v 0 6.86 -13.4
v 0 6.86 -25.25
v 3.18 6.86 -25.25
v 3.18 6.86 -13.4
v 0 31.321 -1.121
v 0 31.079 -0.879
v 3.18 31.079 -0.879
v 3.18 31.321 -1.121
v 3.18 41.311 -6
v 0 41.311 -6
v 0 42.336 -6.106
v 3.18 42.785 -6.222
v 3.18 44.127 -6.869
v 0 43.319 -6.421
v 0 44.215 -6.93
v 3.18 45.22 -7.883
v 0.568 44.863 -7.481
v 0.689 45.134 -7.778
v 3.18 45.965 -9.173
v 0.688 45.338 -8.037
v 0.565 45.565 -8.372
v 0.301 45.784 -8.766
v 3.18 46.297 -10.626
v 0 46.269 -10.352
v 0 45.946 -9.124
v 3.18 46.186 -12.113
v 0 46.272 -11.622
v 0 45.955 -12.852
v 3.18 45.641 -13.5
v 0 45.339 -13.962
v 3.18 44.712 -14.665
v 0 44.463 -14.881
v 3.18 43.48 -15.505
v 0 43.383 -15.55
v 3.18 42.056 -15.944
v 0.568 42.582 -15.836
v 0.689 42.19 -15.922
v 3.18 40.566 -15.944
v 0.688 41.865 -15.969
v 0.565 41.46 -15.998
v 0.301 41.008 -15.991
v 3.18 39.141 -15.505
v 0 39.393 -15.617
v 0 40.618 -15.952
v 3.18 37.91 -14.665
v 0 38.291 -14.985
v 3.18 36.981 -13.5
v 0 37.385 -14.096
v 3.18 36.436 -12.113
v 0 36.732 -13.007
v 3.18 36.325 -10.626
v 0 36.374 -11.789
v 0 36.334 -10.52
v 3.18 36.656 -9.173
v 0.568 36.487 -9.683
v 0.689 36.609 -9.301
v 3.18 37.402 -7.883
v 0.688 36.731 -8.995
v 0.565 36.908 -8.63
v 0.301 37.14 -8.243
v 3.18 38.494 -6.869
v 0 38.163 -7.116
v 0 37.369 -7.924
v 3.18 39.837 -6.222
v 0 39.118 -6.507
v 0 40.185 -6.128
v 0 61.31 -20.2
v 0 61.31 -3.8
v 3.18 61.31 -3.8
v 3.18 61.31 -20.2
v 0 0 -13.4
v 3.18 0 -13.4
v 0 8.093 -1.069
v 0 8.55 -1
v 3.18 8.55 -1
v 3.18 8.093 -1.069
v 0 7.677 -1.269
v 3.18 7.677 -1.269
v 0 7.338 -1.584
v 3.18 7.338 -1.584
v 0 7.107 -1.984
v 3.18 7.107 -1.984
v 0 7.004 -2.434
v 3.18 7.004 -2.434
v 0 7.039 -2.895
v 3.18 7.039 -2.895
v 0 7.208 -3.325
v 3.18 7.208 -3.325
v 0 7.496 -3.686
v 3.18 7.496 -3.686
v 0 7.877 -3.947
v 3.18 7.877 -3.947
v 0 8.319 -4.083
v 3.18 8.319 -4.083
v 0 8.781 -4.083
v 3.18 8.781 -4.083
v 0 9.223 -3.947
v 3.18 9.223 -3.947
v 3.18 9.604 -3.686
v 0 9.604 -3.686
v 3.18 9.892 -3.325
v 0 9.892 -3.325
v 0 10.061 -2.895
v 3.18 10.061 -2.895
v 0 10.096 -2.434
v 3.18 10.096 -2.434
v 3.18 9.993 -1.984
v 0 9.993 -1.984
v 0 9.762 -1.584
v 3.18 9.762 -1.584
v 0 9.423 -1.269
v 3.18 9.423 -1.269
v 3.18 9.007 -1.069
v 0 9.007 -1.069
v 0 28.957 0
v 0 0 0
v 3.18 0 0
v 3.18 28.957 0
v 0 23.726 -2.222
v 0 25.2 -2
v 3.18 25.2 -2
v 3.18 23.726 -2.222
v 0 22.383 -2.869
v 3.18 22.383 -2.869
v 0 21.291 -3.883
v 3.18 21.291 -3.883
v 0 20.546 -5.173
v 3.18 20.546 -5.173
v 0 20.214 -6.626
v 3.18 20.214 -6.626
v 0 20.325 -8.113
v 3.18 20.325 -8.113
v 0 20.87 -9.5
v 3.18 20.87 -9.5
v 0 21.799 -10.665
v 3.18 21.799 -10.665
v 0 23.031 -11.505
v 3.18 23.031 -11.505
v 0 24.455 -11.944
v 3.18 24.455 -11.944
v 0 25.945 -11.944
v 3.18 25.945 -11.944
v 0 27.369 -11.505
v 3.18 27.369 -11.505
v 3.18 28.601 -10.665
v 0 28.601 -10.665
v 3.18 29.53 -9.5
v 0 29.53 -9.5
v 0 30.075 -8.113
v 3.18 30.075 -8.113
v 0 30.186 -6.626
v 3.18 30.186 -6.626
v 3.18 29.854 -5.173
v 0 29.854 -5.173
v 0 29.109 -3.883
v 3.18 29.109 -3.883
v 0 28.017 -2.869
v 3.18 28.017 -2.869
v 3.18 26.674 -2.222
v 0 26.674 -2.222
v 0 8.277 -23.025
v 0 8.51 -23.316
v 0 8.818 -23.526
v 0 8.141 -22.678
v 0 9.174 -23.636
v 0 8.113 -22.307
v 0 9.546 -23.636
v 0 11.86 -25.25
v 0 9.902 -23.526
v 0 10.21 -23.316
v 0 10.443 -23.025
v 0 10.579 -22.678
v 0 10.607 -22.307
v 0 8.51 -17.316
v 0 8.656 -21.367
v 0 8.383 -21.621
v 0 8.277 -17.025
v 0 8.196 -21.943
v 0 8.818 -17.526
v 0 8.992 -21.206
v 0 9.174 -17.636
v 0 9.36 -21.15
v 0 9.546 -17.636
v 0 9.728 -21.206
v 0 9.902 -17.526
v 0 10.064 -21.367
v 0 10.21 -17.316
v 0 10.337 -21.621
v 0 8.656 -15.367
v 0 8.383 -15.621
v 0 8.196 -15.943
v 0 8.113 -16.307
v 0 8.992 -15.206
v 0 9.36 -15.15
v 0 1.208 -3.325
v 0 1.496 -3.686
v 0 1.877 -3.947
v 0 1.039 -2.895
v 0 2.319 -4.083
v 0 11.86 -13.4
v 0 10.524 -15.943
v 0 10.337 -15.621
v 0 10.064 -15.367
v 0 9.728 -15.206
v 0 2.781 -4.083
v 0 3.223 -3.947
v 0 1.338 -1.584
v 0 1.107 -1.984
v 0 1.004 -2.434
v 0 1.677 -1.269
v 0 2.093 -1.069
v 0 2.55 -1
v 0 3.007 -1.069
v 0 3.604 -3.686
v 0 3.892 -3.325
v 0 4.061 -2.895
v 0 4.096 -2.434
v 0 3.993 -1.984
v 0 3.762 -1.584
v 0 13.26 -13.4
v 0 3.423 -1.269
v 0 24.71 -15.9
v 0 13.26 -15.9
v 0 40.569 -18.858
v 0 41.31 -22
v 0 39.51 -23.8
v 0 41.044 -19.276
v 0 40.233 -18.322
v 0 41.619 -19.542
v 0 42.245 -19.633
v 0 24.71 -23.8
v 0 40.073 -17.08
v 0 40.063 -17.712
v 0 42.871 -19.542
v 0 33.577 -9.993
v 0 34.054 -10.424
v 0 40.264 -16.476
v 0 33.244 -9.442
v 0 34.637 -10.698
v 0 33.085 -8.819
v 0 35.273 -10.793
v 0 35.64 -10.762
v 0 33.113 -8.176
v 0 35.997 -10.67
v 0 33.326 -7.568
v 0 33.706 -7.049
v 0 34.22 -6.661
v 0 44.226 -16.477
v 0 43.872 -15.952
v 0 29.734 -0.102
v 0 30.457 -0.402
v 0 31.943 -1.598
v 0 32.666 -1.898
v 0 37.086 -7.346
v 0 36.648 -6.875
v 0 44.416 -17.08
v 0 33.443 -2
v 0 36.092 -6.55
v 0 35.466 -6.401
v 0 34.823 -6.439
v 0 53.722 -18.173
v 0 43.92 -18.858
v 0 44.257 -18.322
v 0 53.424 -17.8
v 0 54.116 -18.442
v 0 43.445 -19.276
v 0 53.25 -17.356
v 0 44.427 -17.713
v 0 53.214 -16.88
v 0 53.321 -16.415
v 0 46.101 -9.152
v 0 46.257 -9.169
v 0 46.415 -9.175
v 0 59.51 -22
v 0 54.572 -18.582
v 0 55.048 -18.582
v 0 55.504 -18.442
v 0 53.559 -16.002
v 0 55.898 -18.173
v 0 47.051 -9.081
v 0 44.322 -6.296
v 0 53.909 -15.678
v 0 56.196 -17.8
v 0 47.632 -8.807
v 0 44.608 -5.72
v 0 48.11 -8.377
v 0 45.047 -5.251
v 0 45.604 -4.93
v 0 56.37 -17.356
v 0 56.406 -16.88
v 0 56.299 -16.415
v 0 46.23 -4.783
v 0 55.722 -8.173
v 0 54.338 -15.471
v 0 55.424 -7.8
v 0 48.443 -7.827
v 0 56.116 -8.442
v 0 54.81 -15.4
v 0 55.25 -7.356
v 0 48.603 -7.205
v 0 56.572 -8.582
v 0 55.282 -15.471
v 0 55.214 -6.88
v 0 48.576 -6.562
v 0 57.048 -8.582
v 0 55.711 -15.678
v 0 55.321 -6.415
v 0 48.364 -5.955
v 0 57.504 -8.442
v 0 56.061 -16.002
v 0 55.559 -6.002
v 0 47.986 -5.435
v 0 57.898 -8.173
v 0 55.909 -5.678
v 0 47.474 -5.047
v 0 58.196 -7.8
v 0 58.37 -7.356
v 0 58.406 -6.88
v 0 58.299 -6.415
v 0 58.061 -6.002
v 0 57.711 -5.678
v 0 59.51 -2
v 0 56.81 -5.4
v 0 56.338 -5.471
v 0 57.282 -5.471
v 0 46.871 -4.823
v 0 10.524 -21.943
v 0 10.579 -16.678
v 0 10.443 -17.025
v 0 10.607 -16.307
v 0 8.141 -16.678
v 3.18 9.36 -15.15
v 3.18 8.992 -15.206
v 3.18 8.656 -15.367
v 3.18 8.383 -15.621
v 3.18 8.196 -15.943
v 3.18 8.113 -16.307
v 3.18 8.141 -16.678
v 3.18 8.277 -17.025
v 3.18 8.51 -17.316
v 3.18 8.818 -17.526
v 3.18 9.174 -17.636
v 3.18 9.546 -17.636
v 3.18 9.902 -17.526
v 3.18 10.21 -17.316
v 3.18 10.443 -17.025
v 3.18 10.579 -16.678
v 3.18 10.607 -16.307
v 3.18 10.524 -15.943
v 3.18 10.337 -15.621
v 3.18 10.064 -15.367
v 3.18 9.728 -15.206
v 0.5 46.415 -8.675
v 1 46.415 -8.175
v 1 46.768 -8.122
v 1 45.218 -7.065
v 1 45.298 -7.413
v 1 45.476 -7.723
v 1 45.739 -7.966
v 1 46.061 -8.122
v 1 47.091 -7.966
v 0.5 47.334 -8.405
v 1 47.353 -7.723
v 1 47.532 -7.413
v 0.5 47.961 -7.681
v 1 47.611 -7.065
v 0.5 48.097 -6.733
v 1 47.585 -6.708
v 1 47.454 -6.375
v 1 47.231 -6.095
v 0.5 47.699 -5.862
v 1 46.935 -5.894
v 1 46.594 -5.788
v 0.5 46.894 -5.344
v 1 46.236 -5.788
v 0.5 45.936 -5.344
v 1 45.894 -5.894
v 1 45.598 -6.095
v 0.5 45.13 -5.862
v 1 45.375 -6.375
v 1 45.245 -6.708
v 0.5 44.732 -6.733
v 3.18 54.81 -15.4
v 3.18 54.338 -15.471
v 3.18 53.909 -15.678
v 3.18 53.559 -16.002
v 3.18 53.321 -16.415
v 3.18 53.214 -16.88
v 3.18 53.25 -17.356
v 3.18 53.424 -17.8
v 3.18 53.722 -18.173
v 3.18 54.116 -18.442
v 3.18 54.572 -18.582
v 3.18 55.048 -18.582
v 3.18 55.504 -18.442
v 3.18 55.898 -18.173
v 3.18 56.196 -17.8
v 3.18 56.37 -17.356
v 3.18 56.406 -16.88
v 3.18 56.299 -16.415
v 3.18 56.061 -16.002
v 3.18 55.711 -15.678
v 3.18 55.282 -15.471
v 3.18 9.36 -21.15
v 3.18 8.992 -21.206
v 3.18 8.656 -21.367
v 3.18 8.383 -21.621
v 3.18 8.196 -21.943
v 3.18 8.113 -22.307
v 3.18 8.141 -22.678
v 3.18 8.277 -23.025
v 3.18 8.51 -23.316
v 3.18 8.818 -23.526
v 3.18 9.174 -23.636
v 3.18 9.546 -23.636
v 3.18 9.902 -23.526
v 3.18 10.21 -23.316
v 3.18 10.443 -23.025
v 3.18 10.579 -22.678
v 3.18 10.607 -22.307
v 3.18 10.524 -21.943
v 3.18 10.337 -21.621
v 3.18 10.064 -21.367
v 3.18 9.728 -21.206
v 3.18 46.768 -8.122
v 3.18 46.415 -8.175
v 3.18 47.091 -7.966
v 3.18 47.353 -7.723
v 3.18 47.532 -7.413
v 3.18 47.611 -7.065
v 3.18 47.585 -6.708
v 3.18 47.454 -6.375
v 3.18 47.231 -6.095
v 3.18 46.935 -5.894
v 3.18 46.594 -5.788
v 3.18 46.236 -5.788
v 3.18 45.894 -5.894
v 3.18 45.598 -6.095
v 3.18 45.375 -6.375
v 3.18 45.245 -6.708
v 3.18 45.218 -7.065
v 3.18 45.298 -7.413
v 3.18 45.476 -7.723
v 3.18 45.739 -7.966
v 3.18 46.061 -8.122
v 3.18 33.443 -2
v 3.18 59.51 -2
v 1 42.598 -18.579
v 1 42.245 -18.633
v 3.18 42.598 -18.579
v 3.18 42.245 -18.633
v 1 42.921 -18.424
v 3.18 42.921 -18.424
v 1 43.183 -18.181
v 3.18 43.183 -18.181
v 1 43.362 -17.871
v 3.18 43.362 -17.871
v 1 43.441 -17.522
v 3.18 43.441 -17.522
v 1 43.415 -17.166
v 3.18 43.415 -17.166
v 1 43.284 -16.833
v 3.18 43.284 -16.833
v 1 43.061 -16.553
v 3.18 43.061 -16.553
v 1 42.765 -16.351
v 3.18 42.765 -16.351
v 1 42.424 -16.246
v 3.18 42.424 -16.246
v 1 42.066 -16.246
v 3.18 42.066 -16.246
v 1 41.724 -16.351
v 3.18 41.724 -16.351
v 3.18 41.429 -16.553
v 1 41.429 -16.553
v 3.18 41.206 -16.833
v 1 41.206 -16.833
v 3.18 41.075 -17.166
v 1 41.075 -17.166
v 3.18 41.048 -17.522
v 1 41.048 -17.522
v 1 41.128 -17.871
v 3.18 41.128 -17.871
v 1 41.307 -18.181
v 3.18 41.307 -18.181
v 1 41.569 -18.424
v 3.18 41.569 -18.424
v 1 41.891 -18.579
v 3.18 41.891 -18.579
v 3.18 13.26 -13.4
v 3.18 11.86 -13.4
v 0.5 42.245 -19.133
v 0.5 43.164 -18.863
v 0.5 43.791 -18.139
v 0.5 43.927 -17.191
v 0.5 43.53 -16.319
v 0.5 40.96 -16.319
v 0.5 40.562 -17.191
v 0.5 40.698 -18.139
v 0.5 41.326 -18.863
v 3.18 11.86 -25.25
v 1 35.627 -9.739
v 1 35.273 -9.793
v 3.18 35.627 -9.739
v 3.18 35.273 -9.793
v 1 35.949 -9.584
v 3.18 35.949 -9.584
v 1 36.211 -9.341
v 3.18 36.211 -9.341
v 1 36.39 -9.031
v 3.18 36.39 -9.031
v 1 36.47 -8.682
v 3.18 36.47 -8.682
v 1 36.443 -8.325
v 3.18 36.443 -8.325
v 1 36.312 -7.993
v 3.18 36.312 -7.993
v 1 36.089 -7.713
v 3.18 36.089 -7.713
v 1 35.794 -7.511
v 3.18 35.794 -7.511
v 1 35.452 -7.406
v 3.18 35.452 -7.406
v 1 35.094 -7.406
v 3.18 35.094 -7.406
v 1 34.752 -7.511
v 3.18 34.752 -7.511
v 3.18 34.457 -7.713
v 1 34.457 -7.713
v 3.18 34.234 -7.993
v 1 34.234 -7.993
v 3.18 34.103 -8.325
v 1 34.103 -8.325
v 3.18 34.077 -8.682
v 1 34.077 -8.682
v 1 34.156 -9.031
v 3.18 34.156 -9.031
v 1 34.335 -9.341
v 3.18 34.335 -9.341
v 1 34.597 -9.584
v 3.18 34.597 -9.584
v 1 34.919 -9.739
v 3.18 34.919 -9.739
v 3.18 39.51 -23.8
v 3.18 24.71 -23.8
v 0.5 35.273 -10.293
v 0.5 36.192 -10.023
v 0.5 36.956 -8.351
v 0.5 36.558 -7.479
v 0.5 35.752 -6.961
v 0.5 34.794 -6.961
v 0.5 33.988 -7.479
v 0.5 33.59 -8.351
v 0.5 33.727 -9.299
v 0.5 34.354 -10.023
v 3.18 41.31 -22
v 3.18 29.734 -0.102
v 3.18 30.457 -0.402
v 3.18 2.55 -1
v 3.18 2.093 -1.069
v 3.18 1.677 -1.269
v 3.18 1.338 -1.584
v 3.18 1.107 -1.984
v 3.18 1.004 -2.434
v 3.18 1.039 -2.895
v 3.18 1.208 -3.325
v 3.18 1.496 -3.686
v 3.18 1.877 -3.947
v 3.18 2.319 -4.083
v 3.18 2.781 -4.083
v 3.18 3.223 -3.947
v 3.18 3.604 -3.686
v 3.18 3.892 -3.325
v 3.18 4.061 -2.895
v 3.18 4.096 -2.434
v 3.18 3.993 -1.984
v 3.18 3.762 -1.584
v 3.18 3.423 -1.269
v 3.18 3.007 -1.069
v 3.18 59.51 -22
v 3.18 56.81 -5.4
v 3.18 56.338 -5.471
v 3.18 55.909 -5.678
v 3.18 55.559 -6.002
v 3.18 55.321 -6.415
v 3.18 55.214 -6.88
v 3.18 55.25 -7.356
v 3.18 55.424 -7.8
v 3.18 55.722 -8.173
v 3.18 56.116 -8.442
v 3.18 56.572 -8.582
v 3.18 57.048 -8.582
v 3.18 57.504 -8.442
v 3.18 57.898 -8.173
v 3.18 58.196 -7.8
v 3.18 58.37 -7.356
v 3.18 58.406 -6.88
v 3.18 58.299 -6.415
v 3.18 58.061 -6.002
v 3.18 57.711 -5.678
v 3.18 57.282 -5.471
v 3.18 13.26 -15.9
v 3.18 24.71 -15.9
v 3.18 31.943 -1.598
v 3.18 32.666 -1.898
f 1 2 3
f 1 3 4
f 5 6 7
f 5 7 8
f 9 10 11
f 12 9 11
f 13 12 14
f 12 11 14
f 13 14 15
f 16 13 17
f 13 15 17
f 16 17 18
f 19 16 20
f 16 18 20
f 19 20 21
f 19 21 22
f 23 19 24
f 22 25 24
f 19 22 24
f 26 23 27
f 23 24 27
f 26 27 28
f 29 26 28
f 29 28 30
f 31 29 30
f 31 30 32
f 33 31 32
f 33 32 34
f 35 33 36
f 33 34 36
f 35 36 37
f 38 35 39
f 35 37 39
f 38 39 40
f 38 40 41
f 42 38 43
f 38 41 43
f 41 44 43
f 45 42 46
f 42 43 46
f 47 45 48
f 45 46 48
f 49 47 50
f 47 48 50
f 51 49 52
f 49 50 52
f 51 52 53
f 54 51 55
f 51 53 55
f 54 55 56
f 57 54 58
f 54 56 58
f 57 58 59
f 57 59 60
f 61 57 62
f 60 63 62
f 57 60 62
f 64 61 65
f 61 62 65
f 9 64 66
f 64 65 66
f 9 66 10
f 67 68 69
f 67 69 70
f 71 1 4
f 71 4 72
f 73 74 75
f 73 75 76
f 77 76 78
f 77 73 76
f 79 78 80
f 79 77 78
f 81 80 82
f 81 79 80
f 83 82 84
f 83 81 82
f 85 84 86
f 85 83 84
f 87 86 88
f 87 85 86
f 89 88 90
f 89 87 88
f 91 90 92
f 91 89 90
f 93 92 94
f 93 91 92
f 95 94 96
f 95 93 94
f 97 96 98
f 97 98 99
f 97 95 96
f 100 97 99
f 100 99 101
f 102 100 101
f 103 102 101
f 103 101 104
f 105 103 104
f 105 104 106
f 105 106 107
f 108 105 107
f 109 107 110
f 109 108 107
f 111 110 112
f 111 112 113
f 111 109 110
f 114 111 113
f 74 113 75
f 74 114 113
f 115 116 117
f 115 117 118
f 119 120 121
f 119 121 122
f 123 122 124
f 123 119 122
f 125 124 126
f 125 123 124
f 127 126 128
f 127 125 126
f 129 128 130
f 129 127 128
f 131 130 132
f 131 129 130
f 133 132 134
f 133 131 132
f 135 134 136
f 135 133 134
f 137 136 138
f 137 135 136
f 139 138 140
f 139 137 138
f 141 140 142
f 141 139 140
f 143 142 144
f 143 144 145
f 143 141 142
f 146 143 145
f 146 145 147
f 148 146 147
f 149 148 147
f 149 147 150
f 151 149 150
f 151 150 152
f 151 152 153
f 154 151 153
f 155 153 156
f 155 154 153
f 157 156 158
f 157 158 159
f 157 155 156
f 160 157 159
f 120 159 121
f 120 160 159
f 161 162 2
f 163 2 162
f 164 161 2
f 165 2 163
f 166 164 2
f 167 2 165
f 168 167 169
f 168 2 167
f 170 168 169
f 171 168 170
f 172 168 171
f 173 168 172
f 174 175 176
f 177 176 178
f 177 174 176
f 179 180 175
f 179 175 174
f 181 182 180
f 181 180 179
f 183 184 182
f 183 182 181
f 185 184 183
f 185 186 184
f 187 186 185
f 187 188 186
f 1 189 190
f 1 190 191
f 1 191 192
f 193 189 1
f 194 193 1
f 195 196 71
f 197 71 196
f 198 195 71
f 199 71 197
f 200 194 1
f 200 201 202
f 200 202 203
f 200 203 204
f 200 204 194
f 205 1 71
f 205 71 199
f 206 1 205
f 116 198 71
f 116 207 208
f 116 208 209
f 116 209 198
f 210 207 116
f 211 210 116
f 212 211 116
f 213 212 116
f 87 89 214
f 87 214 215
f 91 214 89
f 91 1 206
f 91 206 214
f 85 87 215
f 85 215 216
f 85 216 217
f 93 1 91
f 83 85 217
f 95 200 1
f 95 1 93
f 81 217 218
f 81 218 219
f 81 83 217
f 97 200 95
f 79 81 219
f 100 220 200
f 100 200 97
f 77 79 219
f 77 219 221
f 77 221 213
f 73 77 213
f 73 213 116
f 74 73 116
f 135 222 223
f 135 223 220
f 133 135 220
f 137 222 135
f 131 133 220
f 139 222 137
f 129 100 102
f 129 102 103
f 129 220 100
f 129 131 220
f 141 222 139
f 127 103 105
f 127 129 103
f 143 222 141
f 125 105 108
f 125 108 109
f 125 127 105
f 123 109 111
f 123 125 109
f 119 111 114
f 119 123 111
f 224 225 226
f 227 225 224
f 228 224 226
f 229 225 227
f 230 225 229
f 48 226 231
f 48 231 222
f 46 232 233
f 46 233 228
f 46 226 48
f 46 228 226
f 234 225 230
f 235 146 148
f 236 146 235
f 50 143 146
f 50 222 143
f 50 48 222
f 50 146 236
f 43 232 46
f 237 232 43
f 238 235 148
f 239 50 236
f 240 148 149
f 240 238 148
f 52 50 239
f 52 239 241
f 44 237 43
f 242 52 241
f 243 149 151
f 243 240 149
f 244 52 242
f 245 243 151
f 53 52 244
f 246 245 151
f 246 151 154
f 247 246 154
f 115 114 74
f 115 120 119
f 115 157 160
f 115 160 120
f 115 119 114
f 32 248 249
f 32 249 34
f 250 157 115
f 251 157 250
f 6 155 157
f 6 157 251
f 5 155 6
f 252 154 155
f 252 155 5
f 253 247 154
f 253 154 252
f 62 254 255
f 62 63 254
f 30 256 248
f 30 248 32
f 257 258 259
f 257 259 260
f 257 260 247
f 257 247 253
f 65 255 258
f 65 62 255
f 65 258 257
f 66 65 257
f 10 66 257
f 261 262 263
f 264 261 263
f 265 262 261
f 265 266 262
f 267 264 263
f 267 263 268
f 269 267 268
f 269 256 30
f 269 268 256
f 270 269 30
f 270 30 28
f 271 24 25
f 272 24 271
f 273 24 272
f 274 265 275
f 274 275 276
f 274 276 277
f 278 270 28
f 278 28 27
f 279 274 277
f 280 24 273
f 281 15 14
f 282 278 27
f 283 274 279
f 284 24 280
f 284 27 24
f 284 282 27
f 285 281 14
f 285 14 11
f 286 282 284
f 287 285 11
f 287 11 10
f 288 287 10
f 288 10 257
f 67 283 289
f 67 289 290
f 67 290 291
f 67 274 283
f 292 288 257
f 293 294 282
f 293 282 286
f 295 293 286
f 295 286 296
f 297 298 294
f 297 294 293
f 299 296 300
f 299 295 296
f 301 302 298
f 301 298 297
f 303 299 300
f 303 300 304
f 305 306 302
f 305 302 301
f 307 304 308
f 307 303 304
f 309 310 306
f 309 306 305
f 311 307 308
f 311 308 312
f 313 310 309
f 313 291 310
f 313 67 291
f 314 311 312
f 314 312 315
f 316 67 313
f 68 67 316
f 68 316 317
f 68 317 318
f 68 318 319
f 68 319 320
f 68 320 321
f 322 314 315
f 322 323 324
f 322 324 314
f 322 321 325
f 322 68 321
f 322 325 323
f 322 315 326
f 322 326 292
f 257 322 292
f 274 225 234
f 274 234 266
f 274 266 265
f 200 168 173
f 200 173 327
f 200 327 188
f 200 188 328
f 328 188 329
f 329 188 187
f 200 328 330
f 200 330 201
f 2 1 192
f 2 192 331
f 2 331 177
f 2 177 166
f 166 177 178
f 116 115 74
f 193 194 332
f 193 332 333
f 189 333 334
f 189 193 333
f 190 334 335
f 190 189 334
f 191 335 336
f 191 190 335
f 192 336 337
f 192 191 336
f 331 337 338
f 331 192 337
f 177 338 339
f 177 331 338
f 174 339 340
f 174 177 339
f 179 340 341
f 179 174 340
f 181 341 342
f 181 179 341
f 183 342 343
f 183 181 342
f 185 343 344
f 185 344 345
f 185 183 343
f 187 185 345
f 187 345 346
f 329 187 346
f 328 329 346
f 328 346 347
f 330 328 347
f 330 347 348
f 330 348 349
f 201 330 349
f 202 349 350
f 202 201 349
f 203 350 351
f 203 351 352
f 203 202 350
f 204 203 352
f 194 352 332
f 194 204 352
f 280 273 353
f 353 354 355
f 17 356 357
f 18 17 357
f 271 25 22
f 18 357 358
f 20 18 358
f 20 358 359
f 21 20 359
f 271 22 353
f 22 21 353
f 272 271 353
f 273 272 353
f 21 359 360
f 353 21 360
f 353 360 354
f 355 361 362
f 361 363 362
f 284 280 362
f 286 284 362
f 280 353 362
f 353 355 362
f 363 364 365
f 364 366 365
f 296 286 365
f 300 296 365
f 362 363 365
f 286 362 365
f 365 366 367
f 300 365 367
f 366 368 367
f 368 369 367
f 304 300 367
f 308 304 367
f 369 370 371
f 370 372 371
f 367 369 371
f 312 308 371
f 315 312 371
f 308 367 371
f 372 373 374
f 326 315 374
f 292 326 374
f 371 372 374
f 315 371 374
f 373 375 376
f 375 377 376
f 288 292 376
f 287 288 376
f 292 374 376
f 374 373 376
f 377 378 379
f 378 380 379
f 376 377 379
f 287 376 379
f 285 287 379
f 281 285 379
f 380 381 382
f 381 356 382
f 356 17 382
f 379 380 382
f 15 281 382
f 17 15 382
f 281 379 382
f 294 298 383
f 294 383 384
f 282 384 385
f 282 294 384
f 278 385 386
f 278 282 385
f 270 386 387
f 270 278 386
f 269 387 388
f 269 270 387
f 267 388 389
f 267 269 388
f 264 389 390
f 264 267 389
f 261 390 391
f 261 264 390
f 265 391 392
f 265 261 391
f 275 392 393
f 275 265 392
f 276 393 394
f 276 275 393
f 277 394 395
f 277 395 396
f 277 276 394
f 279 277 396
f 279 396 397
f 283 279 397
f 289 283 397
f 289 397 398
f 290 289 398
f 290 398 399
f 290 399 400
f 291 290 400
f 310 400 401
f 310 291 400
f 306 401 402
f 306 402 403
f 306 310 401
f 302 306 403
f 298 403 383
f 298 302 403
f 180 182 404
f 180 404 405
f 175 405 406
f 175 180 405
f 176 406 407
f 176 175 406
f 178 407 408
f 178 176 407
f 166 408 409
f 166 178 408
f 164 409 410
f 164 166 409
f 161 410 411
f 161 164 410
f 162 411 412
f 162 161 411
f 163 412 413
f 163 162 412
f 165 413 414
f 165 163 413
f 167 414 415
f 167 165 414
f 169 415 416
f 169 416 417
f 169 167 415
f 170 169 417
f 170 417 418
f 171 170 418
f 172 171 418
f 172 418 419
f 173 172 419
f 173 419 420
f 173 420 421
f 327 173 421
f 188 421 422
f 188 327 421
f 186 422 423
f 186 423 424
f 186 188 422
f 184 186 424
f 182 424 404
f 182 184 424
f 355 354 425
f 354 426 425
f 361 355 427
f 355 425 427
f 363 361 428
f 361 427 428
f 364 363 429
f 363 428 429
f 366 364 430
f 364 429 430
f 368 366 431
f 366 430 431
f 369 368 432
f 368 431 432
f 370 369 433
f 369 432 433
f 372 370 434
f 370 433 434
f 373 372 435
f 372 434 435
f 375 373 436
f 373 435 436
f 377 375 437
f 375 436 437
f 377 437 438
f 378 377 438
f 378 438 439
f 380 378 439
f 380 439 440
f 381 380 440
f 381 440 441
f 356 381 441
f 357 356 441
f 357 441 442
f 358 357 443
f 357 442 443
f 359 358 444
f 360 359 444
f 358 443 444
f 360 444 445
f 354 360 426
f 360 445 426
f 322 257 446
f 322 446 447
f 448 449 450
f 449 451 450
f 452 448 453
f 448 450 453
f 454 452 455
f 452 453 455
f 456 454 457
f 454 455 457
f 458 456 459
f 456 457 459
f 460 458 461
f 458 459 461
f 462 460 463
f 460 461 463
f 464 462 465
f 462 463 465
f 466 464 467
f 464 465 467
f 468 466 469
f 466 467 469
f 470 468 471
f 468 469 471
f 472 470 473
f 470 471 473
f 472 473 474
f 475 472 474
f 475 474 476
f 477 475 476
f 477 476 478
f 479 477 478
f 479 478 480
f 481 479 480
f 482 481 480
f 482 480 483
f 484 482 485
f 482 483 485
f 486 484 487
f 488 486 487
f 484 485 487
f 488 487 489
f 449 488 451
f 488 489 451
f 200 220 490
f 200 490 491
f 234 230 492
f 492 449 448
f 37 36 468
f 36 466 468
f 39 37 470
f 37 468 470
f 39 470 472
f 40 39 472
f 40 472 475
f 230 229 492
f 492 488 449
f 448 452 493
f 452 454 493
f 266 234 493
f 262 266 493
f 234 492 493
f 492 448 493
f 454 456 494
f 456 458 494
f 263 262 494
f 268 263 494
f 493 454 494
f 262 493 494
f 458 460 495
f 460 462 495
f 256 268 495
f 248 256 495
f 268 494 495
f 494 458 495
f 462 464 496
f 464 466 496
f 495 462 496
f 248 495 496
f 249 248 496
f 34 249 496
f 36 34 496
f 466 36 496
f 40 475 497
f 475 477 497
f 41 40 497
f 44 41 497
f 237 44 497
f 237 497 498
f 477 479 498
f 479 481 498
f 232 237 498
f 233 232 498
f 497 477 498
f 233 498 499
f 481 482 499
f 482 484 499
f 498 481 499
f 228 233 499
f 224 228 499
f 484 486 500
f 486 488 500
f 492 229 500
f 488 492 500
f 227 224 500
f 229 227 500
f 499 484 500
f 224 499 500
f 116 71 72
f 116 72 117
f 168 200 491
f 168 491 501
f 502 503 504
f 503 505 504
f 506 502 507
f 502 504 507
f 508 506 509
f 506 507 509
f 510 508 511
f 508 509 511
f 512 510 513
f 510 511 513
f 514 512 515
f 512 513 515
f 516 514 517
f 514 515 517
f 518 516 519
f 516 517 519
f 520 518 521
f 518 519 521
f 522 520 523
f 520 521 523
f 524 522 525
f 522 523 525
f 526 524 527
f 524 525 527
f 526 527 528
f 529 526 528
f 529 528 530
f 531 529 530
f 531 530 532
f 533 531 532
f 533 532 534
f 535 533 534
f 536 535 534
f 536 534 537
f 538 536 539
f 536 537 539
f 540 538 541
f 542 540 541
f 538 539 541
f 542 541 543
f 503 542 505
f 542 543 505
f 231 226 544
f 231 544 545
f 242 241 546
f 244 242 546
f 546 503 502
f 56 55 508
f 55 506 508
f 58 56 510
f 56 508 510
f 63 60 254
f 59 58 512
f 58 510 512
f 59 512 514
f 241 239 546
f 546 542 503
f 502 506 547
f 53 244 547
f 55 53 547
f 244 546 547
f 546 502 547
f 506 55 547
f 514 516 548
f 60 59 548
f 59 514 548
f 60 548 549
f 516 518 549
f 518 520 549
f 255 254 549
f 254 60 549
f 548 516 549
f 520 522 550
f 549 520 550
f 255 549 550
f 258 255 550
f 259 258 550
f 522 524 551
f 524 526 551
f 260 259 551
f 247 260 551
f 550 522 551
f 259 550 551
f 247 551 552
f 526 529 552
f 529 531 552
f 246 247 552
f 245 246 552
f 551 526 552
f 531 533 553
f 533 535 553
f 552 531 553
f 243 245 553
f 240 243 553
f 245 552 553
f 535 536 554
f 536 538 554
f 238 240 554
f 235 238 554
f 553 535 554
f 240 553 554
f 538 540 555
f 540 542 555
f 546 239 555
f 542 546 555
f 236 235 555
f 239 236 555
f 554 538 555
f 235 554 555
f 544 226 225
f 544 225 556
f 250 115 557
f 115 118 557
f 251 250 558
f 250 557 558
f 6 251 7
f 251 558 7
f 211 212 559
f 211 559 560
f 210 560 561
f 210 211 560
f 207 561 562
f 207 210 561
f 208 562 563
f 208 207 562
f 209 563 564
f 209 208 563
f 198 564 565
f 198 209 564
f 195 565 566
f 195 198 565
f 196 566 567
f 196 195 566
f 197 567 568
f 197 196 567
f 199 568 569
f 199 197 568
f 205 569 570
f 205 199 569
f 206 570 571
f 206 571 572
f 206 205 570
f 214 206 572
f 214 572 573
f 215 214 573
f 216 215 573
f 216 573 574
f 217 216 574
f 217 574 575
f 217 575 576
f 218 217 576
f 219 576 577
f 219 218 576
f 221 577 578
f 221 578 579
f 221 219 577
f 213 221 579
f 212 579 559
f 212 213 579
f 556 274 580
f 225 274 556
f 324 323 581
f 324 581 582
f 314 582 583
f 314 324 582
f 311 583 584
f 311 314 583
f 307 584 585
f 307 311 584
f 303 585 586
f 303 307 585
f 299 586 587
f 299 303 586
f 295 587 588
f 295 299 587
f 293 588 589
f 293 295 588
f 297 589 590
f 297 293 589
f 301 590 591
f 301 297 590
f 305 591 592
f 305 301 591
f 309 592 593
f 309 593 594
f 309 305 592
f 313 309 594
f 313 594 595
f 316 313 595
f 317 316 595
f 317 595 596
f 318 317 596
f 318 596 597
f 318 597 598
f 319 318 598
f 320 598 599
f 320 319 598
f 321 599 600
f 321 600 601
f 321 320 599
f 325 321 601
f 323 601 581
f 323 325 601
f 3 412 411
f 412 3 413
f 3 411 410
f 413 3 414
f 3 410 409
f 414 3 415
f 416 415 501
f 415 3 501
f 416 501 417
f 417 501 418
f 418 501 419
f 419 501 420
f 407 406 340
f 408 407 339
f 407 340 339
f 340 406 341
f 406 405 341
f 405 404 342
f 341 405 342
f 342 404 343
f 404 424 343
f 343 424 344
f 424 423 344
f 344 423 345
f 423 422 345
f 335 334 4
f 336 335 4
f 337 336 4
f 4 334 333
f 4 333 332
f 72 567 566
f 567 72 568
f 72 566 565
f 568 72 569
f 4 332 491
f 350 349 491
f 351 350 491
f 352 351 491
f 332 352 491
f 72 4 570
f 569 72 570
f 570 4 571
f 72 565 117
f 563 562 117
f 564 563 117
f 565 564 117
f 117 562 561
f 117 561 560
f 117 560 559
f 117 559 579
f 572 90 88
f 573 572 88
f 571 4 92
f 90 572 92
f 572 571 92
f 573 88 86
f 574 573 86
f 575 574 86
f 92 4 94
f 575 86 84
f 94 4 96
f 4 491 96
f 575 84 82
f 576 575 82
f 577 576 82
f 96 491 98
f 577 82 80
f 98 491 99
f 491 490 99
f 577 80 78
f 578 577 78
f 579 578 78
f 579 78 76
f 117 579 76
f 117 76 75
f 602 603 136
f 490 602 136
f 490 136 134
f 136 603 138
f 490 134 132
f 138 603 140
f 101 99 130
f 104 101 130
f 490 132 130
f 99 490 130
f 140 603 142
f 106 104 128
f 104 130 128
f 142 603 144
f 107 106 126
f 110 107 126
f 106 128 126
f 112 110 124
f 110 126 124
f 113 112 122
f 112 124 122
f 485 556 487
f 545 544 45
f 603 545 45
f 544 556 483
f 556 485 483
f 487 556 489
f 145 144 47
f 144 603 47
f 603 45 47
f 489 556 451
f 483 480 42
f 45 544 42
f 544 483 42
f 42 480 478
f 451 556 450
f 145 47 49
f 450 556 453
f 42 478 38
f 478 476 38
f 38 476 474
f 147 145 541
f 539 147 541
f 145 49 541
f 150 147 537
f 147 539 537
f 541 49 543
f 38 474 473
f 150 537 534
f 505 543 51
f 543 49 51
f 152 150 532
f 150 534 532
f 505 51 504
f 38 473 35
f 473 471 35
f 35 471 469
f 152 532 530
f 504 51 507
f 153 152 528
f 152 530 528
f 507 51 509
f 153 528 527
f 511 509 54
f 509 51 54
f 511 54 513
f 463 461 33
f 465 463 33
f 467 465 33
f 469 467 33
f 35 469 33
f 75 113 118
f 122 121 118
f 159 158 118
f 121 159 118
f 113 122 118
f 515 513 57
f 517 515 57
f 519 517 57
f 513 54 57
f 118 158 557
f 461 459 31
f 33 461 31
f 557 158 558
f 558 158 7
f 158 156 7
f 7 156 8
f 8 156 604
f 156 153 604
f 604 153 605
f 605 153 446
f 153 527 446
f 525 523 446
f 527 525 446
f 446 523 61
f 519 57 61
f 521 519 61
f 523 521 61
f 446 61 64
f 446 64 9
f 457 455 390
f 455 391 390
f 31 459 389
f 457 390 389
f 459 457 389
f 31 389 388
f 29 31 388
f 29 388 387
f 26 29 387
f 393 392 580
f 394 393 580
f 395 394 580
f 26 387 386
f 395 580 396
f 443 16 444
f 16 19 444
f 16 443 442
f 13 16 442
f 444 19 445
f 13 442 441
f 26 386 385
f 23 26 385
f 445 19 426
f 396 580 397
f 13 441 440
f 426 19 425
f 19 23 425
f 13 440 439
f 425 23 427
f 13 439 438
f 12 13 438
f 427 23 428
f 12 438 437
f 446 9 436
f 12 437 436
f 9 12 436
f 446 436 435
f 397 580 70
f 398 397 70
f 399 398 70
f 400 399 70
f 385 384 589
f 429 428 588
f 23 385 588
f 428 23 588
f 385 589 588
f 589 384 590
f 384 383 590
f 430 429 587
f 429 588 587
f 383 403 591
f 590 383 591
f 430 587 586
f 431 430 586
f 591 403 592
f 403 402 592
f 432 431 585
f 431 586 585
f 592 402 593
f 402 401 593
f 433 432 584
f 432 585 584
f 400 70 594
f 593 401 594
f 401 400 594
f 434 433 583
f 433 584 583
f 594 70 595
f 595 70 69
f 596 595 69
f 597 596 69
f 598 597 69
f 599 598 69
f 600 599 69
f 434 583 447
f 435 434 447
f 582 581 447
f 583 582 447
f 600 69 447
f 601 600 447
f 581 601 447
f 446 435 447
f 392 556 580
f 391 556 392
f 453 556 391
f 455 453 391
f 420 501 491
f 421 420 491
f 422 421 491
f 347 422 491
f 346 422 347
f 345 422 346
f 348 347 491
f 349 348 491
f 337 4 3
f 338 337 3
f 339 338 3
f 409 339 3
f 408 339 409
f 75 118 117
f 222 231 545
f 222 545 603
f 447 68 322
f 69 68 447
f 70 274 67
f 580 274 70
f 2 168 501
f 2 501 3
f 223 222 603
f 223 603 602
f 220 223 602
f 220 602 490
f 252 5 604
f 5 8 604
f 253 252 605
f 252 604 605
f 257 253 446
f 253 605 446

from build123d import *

# Parameters (mm, degrees)
SKETCH1_R                                       = 5
SKETCH1_R_2                                     = 1.6
SKETCH1_R_3                                     = 1.25
SKETCH1_R_4                                     = 1.55
BOSS_EXTRUDE1_DEPTH                             = 3.18
CSK_FOR_M2_FLAT_HEAD_MACHINE_SCREW1_D           = 2.4
CSK_FOR_M2_FLAT_HEAD_MACHINE_SCREW1_DEPTH       = 3.508967257
CSK_FOR_M2_FLAT_HEAD_MACHINE_SCREW1_CSINK_D     = 4.4
CSK_FOR_M2_FLAT_HEAD_MACHINE_SCREW1_CSINK_ANGLE = 90
CSK_FOR_M2_FLAT_HEAD_MACHINE_SCREW1_TIP         = 0.721032743
SKETCH3_R                                       = 5
CUT_EXTRUDE4_DEPTH                              = 67.382158748
FILLET2_R                                       = 3
CHAMFER2_SIZE                                   = 1.8


with BuildPart() as part:
    # Sketch1 → Boss-Extrude1 (new body)
    with BuildSketch(Plane(origin=(0, 0, 0), x_dir=(0, 0, -1), z_dir=(1, 0, 0))):
        Polygon((0, 0), (0, 30.2), (2, 32.2), (2, 61.31), (22, 61.31), (22, 41.31), (23.8, 41.31), (23.8, 24.71), (15.9, 24.71), (15.9, 13.26), (13.4, 13.26), (13.4, 11.86), (25.25, 11.86), (25.25, 6.86), (13.4, 6.86), (13.4, 0), align=None)
        with Locations(Location((7, 25.2, 0), (0, 0, 180))):
            Circle(SKETCH1_R, mode=Mode.SUBTRACT)
        with Locations(Location((7, 56.81, 0), (0, 0, 180))):
            Circle(SKETCH1_R_2, mode=Mode.SUBTRACT)
        with Locations(Location((17, 54.81, 0), (0, 0, 180))):
            Circle(SKETCH1_R_2, mode=Mode.SUBTRACT)
        with Locations(Location((22.4, 9.36, 0), (0, 0, 180))):
            Circle(SKETCH1_R_3, mode=Mode.SUBTRACT)
        with Locations(Location((16.4, 9.36, 0), (0, 0, 180))):
            Circle(SKETCH1_R_3, mode=Mode.SUBTRACT)
        with Locations(Location((2.55, 2.55, 0), (0, 0, 180))):
            Circle(SKETCH1_R_4, mode=Mode.SUBTRACT)
        with Locations(Location((2.55, 8.55, 0), (0, 0, 180))):
            Circle(SKETCH1_R_4, mode=Mode.SUBTRACT)
    extrude(amount=BOSS_EXTRUDE1_DEPTH)

    # CSK for M2 Flat Head Machine Screw1
    with Locations(Plane.ZY):
        with Locations((-6.974936087, 46.414674329), (-17.432559713, 42.244769284), (-8.592504199, 35.273154083)):
            CounterSinkHole(CSK_FOR_M2_FLAT_HEAD_MACHINE_SCREW1_D / 2, CSK_FOR_M2_FLAT_HEAD_MACHINE_SCREW1_CSINK_D / 2, depth=CSK_FOR_M2_FLAT_HEAD_MACHINE_SCREW1_DEPTH, counter_sink_angle=CSK_FOR_M2_FLAT_HEAD_MACHINE_SCREW1_CSINK_ANGLE)
            with Locations((0, 0, -(CSK_FOR_M2_FLAT_HEAD_MACHINE_SCREW1_DEPTH + CSK_FOR_M2_FLAT_HEAD_MACHINE_SCREW1_TIP / 2))):  # 118° drill point
                Cone(0, CSK_FOR_M2_FLAT_HEAD_MACHINE_SCREW1_D / 2, CSK_FOR_M2_FLAT_HEAD_MACHINE_SCREW1_TIP, mode=Mode.SUBTRACT)

    # Sketch3 → Cut-Extrude4 (cut, through all)
    with BuildSketch(Plane.ZY):
        with Locations((-11, 41.310865899)):
            Circle(SKETCH3_R)
    extrude(amount=-CUT_EXTRUDE4_DEPTH, mode=Mode.SUBTRACT)

    # Fillet2
    fillet2_edges = [part.edges().sort_by_distance(p)[0] for p in [
        (1.59, 30.2, 0),
        (1.59, 32.2, -2),
    ]]
    fillet(fillet2_edges, radius=FILLET2_R)

    # Chamfer2
    chamfer2_edges = [part.edges().sort_by_distance(p)[0] for p in [
        (1.59, 61.31, -22),
        (1.59, 61.31, -2),
        (1.59, 41.31, -23.8),
    ]]
    chamfer(chamfer2_edges, length=CHAMFER2_SIZE - 0.0001)  # a hair under: the kernel refuses the full size


solid = part.part
